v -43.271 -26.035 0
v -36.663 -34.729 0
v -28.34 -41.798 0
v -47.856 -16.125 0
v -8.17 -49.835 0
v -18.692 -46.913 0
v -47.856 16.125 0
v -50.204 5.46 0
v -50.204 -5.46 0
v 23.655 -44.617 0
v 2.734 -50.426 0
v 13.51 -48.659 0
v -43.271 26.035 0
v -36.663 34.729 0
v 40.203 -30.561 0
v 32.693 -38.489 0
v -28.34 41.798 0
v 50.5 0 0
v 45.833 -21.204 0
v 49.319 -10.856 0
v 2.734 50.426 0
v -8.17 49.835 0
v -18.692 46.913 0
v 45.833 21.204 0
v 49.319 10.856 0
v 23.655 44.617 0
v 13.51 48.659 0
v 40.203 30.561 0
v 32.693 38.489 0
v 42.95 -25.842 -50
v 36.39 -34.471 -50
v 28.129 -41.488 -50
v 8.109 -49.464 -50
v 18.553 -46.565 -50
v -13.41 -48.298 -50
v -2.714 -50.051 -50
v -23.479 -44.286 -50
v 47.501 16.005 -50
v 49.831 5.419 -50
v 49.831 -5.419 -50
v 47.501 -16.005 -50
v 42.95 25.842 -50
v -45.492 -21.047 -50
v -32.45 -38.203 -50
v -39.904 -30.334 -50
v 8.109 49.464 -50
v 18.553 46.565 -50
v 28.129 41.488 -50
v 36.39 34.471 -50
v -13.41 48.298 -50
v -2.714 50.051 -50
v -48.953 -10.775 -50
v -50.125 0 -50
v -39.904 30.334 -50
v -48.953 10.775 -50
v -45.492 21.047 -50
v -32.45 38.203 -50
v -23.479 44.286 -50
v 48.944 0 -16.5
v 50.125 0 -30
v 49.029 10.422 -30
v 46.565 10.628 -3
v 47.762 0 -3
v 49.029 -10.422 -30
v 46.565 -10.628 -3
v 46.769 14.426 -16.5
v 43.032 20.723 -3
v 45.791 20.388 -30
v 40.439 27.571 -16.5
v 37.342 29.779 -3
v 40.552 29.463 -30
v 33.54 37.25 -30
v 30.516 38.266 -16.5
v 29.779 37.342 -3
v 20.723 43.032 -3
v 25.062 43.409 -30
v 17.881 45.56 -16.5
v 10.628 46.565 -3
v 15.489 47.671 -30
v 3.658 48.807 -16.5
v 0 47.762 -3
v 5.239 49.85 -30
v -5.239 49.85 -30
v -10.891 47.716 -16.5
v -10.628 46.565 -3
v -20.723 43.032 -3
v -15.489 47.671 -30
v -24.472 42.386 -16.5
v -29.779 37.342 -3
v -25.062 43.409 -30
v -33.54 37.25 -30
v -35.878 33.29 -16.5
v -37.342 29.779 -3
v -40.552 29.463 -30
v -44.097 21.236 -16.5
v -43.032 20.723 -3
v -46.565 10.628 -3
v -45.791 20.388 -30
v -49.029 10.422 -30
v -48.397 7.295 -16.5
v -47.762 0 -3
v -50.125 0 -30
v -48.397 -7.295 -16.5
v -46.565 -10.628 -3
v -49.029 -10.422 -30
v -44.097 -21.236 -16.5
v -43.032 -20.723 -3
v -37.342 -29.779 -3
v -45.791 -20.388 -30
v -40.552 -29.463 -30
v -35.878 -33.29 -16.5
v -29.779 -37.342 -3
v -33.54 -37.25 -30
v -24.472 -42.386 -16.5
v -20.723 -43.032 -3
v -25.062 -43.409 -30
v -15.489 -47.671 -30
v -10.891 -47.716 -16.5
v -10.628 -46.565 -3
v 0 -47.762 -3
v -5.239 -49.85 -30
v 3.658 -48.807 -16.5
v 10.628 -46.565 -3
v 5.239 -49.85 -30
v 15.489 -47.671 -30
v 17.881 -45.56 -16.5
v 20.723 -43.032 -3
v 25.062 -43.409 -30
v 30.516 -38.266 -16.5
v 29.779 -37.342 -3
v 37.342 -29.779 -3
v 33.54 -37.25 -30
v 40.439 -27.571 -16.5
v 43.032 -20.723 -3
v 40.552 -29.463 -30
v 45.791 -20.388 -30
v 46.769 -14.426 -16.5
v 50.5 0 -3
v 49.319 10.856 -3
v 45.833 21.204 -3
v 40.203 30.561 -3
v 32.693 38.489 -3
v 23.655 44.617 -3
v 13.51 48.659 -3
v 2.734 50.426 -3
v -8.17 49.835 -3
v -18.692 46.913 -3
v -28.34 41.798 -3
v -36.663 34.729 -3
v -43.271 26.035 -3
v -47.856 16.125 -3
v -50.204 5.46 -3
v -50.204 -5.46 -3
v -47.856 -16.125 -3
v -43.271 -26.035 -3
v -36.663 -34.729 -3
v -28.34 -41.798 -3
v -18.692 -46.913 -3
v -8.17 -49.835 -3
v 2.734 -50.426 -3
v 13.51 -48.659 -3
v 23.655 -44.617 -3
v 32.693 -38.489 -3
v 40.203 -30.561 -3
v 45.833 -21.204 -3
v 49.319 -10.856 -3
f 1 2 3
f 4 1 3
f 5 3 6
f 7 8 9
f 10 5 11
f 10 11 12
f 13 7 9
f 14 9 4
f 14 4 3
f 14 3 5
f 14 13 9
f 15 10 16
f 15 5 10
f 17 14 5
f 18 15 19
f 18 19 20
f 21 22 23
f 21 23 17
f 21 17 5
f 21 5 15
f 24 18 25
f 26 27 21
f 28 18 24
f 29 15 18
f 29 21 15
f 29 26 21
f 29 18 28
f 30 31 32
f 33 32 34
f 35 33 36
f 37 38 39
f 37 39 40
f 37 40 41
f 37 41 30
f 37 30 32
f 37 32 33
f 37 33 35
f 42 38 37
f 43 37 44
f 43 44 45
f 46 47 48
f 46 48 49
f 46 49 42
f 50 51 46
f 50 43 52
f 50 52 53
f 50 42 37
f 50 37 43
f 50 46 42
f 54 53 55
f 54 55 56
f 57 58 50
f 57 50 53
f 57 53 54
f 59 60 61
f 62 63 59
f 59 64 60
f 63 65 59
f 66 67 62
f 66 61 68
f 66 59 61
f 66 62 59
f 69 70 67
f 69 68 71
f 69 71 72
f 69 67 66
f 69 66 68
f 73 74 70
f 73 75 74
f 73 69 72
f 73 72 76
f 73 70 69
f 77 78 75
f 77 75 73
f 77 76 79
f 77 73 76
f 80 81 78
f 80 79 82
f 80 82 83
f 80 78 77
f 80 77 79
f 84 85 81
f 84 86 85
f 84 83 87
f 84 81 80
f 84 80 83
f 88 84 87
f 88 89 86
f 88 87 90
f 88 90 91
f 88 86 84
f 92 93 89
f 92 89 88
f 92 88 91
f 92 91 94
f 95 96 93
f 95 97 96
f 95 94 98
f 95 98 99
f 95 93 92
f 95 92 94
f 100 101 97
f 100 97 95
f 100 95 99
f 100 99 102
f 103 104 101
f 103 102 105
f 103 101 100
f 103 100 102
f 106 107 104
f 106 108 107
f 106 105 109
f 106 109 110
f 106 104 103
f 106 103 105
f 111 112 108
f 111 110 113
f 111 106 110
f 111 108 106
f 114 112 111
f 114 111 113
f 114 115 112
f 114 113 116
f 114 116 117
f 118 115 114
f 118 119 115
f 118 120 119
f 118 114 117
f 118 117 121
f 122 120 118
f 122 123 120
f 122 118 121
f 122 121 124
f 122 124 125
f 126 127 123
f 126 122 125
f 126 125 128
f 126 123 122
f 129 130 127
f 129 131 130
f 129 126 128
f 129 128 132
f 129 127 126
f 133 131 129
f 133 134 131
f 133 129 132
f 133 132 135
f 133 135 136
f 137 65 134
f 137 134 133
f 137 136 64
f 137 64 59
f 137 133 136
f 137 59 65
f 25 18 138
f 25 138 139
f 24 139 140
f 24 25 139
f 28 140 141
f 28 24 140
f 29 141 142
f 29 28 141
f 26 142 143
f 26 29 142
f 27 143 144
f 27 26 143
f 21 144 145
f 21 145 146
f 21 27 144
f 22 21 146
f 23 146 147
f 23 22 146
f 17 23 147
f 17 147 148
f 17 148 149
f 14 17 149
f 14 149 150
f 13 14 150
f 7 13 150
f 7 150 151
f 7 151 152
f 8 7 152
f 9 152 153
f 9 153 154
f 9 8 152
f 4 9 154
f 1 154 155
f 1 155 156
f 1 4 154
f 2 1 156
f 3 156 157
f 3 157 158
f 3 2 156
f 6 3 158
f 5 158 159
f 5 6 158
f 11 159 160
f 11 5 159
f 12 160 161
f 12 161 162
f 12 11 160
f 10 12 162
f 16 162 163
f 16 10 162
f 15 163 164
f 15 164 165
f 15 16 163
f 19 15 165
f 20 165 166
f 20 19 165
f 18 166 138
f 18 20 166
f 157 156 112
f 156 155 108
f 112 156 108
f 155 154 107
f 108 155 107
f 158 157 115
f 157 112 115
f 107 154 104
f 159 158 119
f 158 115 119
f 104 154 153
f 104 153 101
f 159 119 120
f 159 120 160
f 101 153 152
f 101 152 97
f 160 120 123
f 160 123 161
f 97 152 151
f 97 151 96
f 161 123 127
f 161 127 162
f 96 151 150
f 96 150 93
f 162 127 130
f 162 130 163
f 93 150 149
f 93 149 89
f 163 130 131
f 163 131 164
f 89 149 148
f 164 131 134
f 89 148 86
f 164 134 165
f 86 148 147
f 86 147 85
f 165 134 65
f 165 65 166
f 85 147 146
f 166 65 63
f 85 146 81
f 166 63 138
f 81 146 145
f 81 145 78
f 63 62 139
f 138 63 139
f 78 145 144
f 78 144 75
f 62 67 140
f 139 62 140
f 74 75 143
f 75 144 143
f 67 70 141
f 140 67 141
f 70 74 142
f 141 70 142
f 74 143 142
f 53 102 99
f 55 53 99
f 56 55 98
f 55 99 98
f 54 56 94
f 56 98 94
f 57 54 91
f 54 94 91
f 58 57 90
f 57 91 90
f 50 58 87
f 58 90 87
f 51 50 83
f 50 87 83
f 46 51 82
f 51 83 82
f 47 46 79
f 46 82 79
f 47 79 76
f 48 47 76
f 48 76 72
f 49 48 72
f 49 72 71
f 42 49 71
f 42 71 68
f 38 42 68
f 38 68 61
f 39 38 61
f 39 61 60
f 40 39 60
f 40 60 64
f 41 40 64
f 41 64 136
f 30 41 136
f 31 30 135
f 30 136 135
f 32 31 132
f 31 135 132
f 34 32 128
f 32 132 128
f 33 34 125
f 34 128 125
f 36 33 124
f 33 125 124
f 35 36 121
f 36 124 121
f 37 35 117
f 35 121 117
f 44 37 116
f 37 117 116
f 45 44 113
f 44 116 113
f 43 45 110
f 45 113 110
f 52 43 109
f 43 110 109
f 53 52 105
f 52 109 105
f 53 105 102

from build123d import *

# Parameters (mm, degrees)
SKETCH1_R           = 47.5
BOSS_EXTRUDE1_DEPTH = 30
BOSS_EXTRUDE1_DRAFT = 5
SKETCH1_3_R         = 50.5
BOSS_EXTRUDE2_DEPTH = 3
SKETCH2_R           = 50.124659906
BOSS_EXTRUDE3_DEPTH = 20


with BuildPart() as part:
    # Sketch1 → Boss-Extrude1 (with draft: the straight prism first)
    with BuildSketch(Plane.XY):
        Circle(SKETCH1_R)
    extrude(amount=-BOSS_EXTRUDE1_DEPTH)
    # Boss-Extrude1: the draft: its side faces are tilted about the plane it starts from
    boss_extrude1_sides = [part.faces().sort_by_distance(p)[0] for p in [
        (-47.5, 0, -15),
    ]]
    draft(boss_extrude1_sides, Plane.XY, BOSS_EXTRUDE1_DRAFT)

    # Sketch1<3> → Boss-Extrude2 (add)
    with BuildSketch(Plane.XY):
        Circle(SKETCH1_3_R)
    extrude(amount=-BOSS_EXTRUDE2_DEPTH)

    # Sketch2 → Boss-Extrude3 (add)
    with BuildSketch(Plane(origin=(0, 0, -30), x_dir=(-1, 0, 0), z_dir=(0, 0, -1))):
        Circle(SKETCH2_R)
    extrude(amount=BOSS_EXTRUDE3_DEPTH)


solid = part.part
